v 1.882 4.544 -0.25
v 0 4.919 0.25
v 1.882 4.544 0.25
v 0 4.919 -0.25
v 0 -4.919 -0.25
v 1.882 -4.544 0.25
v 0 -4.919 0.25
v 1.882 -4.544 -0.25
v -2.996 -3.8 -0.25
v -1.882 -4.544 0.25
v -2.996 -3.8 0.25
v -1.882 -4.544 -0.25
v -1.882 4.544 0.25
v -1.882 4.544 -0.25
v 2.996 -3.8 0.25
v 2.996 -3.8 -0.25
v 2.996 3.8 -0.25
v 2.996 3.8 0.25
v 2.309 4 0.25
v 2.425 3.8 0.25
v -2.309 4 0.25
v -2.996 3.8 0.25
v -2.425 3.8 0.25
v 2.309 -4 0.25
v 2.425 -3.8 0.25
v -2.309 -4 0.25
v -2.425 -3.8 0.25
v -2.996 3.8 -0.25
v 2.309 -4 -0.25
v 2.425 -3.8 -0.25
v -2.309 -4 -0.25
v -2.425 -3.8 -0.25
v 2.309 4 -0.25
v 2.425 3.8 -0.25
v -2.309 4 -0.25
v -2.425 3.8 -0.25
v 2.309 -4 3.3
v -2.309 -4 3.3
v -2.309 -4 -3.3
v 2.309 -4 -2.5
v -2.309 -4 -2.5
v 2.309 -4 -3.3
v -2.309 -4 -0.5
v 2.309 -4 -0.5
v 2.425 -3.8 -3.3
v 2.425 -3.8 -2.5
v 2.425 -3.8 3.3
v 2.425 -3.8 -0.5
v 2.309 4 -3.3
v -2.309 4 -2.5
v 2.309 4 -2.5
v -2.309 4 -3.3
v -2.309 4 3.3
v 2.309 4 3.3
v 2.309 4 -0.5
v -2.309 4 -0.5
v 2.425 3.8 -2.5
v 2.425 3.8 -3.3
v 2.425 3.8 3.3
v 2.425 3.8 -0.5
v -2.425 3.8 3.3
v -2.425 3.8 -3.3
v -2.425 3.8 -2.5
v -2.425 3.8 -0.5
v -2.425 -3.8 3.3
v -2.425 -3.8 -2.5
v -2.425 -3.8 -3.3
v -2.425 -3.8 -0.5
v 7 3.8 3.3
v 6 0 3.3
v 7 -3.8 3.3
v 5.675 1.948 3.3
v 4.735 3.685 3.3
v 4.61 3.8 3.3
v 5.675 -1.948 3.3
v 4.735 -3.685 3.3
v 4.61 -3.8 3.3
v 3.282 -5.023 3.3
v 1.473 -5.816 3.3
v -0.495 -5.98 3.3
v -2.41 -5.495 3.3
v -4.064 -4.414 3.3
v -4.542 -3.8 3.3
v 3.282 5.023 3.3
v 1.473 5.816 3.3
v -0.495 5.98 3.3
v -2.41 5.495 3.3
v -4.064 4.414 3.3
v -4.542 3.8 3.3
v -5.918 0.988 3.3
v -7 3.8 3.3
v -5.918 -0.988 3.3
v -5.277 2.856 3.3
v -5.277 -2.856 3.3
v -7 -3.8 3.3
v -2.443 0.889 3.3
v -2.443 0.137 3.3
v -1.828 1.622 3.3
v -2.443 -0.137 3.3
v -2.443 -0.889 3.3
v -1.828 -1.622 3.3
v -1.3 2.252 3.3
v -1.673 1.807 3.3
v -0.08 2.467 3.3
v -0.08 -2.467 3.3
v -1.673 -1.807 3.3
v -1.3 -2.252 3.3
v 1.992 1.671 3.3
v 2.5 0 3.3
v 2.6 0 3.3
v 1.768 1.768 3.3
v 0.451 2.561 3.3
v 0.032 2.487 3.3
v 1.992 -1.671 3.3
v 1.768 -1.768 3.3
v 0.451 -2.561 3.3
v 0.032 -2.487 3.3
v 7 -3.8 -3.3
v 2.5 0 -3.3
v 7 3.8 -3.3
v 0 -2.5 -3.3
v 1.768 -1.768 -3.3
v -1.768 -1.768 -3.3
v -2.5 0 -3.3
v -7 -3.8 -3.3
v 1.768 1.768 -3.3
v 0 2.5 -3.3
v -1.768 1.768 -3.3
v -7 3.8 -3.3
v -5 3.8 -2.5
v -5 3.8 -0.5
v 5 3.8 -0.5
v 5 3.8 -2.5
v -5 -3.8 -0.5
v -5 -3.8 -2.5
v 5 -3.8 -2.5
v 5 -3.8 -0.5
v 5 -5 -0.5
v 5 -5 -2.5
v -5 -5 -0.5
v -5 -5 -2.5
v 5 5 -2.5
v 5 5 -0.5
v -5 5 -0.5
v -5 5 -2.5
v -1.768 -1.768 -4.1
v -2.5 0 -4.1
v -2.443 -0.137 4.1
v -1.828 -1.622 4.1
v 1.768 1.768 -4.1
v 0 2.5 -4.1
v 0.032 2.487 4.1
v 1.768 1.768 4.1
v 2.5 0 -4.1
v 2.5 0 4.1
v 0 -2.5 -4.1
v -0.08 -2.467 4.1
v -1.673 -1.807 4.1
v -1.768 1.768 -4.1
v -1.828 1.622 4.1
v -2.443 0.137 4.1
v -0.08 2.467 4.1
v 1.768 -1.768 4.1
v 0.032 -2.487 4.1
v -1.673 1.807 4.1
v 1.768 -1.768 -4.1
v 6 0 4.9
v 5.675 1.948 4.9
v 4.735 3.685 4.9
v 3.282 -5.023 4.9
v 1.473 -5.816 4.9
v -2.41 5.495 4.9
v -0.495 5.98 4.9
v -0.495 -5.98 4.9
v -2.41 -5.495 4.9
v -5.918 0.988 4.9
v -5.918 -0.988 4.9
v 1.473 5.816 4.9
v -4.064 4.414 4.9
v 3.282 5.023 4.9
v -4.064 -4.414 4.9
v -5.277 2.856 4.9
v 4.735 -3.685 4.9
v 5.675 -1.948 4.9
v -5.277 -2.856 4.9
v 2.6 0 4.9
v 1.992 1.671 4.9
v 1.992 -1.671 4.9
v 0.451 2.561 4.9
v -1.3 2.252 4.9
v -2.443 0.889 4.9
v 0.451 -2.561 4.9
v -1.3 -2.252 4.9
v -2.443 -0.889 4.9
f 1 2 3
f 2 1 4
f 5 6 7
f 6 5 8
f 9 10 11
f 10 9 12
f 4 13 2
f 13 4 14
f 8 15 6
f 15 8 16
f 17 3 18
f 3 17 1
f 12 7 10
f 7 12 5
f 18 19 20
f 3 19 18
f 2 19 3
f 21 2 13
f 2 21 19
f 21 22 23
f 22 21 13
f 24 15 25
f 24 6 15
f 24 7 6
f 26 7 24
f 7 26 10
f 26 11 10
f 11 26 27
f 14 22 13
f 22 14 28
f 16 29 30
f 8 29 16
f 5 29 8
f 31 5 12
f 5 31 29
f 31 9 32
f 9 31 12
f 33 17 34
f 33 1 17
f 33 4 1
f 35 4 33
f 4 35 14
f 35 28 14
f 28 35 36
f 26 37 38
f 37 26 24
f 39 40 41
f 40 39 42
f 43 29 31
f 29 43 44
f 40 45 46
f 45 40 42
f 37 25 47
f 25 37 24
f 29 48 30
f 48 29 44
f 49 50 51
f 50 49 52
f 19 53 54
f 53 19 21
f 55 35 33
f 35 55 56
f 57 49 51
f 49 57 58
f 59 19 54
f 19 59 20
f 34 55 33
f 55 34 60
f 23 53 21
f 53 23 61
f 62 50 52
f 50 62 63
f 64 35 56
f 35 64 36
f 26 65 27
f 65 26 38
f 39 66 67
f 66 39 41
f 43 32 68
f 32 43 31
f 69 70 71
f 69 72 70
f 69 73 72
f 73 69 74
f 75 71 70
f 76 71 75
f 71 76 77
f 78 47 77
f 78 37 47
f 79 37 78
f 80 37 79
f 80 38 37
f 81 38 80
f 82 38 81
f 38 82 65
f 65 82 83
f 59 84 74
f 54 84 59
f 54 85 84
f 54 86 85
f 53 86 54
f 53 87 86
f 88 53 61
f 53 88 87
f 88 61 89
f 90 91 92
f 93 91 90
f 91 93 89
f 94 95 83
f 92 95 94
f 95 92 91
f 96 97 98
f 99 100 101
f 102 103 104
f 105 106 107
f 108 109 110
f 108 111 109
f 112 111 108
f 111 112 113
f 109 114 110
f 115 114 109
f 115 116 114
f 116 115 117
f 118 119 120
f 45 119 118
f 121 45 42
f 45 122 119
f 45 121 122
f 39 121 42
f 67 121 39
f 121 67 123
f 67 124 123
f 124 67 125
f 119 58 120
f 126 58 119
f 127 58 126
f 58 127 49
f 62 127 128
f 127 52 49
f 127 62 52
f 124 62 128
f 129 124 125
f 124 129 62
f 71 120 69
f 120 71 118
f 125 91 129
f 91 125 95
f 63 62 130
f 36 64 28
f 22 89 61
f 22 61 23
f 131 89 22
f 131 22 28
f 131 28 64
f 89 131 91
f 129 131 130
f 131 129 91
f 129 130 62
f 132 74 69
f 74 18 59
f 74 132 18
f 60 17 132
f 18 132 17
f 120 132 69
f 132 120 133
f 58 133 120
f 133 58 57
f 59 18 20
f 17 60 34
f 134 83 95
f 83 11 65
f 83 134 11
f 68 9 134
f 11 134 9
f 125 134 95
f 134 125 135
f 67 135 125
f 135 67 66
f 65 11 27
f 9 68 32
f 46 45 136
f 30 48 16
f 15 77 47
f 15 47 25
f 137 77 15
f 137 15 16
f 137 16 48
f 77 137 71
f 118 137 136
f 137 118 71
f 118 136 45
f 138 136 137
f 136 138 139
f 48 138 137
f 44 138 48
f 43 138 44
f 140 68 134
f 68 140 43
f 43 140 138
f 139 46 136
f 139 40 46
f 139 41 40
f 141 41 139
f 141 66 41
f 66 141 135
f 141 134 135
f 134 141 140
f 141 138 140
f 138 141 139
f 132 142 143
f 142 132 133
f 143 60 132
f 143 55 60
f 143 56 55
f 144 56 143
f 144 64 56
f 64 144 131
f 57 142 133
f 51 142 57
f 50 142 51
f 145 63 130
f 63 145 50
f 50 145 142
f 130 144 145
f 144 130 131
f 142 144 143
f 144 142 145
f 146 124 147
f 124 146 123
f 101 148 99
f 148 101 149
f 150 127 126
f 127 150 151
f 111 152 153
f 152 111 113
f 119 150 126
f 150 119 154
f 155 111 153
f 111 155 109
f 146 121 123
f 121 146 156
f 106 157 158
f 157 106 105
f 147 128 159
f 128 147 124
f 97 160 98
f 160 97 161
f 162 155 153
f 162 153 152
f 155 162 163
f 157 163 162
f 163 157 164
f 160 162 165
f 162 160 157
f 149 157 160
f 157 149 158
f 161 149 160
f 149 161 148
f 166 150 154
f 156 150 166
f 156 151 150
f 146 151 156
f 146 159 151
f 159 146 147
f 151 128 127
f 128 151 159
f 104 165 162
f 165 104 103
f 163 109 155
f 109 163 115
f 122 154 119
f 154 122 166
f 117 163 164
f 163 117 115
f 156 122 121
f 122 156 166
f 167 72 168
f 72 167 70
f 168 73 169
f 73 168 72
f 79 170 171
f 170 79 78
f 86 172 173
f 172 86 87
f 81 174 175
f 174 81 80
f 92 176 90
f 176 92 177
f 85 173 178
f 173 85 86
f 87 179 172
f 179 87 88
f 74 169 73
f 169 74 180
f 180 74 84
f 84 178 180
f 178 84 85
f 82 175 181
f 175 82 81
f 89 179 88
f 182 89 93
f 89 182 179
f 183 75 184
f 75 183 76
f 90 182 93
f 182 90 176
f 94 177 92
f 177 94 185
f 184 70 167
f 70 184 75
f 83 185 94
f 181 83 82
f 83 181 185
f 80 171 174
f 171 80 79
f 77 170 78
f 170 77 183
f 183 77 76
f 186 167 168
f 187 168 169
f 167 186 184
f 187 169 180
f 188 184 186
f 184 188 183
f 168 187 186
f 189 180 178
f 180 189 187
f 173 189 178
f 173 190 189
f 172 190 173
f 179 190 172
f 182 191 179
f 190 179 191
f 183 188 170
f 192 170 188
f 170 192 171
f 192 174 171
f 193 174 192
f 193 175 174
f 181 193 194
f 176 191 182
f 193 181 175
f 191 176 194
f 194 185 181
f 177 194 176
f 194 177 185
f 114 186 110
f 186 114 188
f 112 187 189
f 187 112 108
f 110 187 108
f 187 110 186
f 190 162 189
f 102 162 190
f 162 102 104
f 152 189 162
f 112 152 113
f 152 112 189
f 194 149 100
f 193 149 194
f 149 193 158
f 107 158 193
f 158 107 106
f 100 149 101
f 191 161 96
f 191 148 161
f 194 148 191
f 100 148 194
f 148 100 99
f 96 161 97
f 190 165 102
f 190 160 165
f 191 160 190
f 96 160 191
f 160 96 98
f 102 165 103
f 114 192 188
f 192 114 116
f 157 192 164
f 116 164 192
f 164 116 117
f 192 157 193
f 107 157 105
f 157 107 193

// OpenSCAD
// Parameters
screw_nominal_diameter_mm = 6.0; //[3.0:12.0:0.1]
thread_pitch_mm = 1.0; //[0.5:2.0:0.1]
across_flats_mm = 8.0; //[4.0:16.0:0.1]
thickness_mm = 6.6; //[3.3:13.2:0.1]
t_slot_width_mm = 12.0; //[8.0:24.0:0.1]
t_slot_neck_width_mm = 8.0; //[5.0:16.0:0.1]
t_slot_depth_mm = 6.0; //[3.0:12.0:0.1]
t_slot_entry_chamfer_mm = 0.5; //[0.0:2.0:0.1]
edge_chamfer_mm = 0.3; //[0.0:1.5:0.1]
corner_fillet_mm = 0.0; //[0.0:2.0:0.1]
threaded = 1; //[0:1:1]
thread_tap_drill_diameter_mm = 5.0; //[3.0:10.0:0.1]
clearance_hole_diameter_mm = 6.6; //[6.0:8.0:0.1]
tolerance_mm = 0.2; //[0.0:0.6:0.05]
overlap_mm = 0.8; //[0.5:2.0:0.1]
hex_circumradius_mm = 4.6188; //[2.3094:9.2376:0.0001]
body_width_mm = 7.6; //[4.0:15.0:0.1]
body_length_mm = 14.0; //[8.0:28.0:0.1]
wing_thickness_mm = 2.0; //[1.0:4.0:0.1]
wing_length_mm = 10.0; //[6.0:20.0:0.1]
wing_drop_mm = 2.0; //[1.0:4.0:0.1]
washer_outer_diameter_mm = 12.0; //[8.0:24.0:0.1]
washer_thickness_mm = 1.6; //[0.8:3.2:0.1]
assembly_gap_mm = 0.8; //[0.0:5.0:0.1]

// Nut and Washer - complete geometry
module nut_and_washer() {
  color("DimGray") {
    // Hexagonal profile
    cylinder(r=hex_circumradius_mm, h=thickness_mm, center=true, $fn=6);
    
    // T-slot nut body
    translate([0, 0, 0])
      cube([body_length_mm, body_width_mm, thickness_mm], center=true);
    
    // Retention wings
    translate([0, -(body_width_mm/2 + wing_thickness_mm/2 - overlap_mm), -(thickness_mm/2 - wing_drop_mm/2 - overlap_mm)])
      cube([wing_length_mm, wing_thickness_mm, wing_drop_mm], center=true);
    translate([0, (body_width_mm/2 + wing_thickness_mm/2 - overlap_mm), -(thickness_mm/2 - wing_drop_mm/2 - overlap_mm)])
      cube([wing_length_mm, wing_thickness_mm, wing_drop_mm], center=true);
    
    // Internal thread or clearance hole
    difference() {
      cylinder(r=((threaded*thread_tap_drill_diameter_mm) + ((1-threaded)*clearance_hole_diameter_mm))/2, h=thickness_mm + 2*overlap_mm, center=true);
    }
    
    // Lead-in chamfers
    difference() {
      cylinder(r=hex_circumradius_mm + edge_chamfer_mm, h=t_slot_entry_chamfer_mm, center=true);
      translate([0, 0, (thickness_mm/2 - t_slot_entry_chamfer_mm/2 + overlap_mm/2)])
        rotate([180, 0, 0])
        cylinder(r=hex_circumradius_mm + edge_chamfer_mm, h=t_slot_entry_chamfer_mm, center=true);
      translate([0, 0, -(thickness_mm/2 - t_slot_entry_chamfer_mm/2 + overlap_mm/2)])
        cylinder(r=hex_circumradius_mm + edge_chamfer_mm, h=t_slot_entry_chamfer_mm, center=true);
    }
  }
  
  // Washer
  color("Silver") {
    difference() {
      translate([0, 0, (thickness_mm/2 + washer_thickness_mm/2 + assembly_gap_mm - overlap_mm)])
        cylinder(r=washer_outer_diameter_mm/2, h=washer_thickness_mm, center=true);
      translate([0, 0, (thickness_mm/2 + washer_thickness_mm/2 + assembly_gap_mm - overlap_mm)])
        cylinder(r=(((threaded*thread_tap_drill_diameter_mm) + ((1-threaded)*clearance_hole_diameter_mm))/2) + tolerance_mm/2, h=washer_thickness_mm + 2*overlap_mm, center=true);
    }
  }
}

// Assembly
module assembly() {
  nut_and_washer();
}

assembly();
